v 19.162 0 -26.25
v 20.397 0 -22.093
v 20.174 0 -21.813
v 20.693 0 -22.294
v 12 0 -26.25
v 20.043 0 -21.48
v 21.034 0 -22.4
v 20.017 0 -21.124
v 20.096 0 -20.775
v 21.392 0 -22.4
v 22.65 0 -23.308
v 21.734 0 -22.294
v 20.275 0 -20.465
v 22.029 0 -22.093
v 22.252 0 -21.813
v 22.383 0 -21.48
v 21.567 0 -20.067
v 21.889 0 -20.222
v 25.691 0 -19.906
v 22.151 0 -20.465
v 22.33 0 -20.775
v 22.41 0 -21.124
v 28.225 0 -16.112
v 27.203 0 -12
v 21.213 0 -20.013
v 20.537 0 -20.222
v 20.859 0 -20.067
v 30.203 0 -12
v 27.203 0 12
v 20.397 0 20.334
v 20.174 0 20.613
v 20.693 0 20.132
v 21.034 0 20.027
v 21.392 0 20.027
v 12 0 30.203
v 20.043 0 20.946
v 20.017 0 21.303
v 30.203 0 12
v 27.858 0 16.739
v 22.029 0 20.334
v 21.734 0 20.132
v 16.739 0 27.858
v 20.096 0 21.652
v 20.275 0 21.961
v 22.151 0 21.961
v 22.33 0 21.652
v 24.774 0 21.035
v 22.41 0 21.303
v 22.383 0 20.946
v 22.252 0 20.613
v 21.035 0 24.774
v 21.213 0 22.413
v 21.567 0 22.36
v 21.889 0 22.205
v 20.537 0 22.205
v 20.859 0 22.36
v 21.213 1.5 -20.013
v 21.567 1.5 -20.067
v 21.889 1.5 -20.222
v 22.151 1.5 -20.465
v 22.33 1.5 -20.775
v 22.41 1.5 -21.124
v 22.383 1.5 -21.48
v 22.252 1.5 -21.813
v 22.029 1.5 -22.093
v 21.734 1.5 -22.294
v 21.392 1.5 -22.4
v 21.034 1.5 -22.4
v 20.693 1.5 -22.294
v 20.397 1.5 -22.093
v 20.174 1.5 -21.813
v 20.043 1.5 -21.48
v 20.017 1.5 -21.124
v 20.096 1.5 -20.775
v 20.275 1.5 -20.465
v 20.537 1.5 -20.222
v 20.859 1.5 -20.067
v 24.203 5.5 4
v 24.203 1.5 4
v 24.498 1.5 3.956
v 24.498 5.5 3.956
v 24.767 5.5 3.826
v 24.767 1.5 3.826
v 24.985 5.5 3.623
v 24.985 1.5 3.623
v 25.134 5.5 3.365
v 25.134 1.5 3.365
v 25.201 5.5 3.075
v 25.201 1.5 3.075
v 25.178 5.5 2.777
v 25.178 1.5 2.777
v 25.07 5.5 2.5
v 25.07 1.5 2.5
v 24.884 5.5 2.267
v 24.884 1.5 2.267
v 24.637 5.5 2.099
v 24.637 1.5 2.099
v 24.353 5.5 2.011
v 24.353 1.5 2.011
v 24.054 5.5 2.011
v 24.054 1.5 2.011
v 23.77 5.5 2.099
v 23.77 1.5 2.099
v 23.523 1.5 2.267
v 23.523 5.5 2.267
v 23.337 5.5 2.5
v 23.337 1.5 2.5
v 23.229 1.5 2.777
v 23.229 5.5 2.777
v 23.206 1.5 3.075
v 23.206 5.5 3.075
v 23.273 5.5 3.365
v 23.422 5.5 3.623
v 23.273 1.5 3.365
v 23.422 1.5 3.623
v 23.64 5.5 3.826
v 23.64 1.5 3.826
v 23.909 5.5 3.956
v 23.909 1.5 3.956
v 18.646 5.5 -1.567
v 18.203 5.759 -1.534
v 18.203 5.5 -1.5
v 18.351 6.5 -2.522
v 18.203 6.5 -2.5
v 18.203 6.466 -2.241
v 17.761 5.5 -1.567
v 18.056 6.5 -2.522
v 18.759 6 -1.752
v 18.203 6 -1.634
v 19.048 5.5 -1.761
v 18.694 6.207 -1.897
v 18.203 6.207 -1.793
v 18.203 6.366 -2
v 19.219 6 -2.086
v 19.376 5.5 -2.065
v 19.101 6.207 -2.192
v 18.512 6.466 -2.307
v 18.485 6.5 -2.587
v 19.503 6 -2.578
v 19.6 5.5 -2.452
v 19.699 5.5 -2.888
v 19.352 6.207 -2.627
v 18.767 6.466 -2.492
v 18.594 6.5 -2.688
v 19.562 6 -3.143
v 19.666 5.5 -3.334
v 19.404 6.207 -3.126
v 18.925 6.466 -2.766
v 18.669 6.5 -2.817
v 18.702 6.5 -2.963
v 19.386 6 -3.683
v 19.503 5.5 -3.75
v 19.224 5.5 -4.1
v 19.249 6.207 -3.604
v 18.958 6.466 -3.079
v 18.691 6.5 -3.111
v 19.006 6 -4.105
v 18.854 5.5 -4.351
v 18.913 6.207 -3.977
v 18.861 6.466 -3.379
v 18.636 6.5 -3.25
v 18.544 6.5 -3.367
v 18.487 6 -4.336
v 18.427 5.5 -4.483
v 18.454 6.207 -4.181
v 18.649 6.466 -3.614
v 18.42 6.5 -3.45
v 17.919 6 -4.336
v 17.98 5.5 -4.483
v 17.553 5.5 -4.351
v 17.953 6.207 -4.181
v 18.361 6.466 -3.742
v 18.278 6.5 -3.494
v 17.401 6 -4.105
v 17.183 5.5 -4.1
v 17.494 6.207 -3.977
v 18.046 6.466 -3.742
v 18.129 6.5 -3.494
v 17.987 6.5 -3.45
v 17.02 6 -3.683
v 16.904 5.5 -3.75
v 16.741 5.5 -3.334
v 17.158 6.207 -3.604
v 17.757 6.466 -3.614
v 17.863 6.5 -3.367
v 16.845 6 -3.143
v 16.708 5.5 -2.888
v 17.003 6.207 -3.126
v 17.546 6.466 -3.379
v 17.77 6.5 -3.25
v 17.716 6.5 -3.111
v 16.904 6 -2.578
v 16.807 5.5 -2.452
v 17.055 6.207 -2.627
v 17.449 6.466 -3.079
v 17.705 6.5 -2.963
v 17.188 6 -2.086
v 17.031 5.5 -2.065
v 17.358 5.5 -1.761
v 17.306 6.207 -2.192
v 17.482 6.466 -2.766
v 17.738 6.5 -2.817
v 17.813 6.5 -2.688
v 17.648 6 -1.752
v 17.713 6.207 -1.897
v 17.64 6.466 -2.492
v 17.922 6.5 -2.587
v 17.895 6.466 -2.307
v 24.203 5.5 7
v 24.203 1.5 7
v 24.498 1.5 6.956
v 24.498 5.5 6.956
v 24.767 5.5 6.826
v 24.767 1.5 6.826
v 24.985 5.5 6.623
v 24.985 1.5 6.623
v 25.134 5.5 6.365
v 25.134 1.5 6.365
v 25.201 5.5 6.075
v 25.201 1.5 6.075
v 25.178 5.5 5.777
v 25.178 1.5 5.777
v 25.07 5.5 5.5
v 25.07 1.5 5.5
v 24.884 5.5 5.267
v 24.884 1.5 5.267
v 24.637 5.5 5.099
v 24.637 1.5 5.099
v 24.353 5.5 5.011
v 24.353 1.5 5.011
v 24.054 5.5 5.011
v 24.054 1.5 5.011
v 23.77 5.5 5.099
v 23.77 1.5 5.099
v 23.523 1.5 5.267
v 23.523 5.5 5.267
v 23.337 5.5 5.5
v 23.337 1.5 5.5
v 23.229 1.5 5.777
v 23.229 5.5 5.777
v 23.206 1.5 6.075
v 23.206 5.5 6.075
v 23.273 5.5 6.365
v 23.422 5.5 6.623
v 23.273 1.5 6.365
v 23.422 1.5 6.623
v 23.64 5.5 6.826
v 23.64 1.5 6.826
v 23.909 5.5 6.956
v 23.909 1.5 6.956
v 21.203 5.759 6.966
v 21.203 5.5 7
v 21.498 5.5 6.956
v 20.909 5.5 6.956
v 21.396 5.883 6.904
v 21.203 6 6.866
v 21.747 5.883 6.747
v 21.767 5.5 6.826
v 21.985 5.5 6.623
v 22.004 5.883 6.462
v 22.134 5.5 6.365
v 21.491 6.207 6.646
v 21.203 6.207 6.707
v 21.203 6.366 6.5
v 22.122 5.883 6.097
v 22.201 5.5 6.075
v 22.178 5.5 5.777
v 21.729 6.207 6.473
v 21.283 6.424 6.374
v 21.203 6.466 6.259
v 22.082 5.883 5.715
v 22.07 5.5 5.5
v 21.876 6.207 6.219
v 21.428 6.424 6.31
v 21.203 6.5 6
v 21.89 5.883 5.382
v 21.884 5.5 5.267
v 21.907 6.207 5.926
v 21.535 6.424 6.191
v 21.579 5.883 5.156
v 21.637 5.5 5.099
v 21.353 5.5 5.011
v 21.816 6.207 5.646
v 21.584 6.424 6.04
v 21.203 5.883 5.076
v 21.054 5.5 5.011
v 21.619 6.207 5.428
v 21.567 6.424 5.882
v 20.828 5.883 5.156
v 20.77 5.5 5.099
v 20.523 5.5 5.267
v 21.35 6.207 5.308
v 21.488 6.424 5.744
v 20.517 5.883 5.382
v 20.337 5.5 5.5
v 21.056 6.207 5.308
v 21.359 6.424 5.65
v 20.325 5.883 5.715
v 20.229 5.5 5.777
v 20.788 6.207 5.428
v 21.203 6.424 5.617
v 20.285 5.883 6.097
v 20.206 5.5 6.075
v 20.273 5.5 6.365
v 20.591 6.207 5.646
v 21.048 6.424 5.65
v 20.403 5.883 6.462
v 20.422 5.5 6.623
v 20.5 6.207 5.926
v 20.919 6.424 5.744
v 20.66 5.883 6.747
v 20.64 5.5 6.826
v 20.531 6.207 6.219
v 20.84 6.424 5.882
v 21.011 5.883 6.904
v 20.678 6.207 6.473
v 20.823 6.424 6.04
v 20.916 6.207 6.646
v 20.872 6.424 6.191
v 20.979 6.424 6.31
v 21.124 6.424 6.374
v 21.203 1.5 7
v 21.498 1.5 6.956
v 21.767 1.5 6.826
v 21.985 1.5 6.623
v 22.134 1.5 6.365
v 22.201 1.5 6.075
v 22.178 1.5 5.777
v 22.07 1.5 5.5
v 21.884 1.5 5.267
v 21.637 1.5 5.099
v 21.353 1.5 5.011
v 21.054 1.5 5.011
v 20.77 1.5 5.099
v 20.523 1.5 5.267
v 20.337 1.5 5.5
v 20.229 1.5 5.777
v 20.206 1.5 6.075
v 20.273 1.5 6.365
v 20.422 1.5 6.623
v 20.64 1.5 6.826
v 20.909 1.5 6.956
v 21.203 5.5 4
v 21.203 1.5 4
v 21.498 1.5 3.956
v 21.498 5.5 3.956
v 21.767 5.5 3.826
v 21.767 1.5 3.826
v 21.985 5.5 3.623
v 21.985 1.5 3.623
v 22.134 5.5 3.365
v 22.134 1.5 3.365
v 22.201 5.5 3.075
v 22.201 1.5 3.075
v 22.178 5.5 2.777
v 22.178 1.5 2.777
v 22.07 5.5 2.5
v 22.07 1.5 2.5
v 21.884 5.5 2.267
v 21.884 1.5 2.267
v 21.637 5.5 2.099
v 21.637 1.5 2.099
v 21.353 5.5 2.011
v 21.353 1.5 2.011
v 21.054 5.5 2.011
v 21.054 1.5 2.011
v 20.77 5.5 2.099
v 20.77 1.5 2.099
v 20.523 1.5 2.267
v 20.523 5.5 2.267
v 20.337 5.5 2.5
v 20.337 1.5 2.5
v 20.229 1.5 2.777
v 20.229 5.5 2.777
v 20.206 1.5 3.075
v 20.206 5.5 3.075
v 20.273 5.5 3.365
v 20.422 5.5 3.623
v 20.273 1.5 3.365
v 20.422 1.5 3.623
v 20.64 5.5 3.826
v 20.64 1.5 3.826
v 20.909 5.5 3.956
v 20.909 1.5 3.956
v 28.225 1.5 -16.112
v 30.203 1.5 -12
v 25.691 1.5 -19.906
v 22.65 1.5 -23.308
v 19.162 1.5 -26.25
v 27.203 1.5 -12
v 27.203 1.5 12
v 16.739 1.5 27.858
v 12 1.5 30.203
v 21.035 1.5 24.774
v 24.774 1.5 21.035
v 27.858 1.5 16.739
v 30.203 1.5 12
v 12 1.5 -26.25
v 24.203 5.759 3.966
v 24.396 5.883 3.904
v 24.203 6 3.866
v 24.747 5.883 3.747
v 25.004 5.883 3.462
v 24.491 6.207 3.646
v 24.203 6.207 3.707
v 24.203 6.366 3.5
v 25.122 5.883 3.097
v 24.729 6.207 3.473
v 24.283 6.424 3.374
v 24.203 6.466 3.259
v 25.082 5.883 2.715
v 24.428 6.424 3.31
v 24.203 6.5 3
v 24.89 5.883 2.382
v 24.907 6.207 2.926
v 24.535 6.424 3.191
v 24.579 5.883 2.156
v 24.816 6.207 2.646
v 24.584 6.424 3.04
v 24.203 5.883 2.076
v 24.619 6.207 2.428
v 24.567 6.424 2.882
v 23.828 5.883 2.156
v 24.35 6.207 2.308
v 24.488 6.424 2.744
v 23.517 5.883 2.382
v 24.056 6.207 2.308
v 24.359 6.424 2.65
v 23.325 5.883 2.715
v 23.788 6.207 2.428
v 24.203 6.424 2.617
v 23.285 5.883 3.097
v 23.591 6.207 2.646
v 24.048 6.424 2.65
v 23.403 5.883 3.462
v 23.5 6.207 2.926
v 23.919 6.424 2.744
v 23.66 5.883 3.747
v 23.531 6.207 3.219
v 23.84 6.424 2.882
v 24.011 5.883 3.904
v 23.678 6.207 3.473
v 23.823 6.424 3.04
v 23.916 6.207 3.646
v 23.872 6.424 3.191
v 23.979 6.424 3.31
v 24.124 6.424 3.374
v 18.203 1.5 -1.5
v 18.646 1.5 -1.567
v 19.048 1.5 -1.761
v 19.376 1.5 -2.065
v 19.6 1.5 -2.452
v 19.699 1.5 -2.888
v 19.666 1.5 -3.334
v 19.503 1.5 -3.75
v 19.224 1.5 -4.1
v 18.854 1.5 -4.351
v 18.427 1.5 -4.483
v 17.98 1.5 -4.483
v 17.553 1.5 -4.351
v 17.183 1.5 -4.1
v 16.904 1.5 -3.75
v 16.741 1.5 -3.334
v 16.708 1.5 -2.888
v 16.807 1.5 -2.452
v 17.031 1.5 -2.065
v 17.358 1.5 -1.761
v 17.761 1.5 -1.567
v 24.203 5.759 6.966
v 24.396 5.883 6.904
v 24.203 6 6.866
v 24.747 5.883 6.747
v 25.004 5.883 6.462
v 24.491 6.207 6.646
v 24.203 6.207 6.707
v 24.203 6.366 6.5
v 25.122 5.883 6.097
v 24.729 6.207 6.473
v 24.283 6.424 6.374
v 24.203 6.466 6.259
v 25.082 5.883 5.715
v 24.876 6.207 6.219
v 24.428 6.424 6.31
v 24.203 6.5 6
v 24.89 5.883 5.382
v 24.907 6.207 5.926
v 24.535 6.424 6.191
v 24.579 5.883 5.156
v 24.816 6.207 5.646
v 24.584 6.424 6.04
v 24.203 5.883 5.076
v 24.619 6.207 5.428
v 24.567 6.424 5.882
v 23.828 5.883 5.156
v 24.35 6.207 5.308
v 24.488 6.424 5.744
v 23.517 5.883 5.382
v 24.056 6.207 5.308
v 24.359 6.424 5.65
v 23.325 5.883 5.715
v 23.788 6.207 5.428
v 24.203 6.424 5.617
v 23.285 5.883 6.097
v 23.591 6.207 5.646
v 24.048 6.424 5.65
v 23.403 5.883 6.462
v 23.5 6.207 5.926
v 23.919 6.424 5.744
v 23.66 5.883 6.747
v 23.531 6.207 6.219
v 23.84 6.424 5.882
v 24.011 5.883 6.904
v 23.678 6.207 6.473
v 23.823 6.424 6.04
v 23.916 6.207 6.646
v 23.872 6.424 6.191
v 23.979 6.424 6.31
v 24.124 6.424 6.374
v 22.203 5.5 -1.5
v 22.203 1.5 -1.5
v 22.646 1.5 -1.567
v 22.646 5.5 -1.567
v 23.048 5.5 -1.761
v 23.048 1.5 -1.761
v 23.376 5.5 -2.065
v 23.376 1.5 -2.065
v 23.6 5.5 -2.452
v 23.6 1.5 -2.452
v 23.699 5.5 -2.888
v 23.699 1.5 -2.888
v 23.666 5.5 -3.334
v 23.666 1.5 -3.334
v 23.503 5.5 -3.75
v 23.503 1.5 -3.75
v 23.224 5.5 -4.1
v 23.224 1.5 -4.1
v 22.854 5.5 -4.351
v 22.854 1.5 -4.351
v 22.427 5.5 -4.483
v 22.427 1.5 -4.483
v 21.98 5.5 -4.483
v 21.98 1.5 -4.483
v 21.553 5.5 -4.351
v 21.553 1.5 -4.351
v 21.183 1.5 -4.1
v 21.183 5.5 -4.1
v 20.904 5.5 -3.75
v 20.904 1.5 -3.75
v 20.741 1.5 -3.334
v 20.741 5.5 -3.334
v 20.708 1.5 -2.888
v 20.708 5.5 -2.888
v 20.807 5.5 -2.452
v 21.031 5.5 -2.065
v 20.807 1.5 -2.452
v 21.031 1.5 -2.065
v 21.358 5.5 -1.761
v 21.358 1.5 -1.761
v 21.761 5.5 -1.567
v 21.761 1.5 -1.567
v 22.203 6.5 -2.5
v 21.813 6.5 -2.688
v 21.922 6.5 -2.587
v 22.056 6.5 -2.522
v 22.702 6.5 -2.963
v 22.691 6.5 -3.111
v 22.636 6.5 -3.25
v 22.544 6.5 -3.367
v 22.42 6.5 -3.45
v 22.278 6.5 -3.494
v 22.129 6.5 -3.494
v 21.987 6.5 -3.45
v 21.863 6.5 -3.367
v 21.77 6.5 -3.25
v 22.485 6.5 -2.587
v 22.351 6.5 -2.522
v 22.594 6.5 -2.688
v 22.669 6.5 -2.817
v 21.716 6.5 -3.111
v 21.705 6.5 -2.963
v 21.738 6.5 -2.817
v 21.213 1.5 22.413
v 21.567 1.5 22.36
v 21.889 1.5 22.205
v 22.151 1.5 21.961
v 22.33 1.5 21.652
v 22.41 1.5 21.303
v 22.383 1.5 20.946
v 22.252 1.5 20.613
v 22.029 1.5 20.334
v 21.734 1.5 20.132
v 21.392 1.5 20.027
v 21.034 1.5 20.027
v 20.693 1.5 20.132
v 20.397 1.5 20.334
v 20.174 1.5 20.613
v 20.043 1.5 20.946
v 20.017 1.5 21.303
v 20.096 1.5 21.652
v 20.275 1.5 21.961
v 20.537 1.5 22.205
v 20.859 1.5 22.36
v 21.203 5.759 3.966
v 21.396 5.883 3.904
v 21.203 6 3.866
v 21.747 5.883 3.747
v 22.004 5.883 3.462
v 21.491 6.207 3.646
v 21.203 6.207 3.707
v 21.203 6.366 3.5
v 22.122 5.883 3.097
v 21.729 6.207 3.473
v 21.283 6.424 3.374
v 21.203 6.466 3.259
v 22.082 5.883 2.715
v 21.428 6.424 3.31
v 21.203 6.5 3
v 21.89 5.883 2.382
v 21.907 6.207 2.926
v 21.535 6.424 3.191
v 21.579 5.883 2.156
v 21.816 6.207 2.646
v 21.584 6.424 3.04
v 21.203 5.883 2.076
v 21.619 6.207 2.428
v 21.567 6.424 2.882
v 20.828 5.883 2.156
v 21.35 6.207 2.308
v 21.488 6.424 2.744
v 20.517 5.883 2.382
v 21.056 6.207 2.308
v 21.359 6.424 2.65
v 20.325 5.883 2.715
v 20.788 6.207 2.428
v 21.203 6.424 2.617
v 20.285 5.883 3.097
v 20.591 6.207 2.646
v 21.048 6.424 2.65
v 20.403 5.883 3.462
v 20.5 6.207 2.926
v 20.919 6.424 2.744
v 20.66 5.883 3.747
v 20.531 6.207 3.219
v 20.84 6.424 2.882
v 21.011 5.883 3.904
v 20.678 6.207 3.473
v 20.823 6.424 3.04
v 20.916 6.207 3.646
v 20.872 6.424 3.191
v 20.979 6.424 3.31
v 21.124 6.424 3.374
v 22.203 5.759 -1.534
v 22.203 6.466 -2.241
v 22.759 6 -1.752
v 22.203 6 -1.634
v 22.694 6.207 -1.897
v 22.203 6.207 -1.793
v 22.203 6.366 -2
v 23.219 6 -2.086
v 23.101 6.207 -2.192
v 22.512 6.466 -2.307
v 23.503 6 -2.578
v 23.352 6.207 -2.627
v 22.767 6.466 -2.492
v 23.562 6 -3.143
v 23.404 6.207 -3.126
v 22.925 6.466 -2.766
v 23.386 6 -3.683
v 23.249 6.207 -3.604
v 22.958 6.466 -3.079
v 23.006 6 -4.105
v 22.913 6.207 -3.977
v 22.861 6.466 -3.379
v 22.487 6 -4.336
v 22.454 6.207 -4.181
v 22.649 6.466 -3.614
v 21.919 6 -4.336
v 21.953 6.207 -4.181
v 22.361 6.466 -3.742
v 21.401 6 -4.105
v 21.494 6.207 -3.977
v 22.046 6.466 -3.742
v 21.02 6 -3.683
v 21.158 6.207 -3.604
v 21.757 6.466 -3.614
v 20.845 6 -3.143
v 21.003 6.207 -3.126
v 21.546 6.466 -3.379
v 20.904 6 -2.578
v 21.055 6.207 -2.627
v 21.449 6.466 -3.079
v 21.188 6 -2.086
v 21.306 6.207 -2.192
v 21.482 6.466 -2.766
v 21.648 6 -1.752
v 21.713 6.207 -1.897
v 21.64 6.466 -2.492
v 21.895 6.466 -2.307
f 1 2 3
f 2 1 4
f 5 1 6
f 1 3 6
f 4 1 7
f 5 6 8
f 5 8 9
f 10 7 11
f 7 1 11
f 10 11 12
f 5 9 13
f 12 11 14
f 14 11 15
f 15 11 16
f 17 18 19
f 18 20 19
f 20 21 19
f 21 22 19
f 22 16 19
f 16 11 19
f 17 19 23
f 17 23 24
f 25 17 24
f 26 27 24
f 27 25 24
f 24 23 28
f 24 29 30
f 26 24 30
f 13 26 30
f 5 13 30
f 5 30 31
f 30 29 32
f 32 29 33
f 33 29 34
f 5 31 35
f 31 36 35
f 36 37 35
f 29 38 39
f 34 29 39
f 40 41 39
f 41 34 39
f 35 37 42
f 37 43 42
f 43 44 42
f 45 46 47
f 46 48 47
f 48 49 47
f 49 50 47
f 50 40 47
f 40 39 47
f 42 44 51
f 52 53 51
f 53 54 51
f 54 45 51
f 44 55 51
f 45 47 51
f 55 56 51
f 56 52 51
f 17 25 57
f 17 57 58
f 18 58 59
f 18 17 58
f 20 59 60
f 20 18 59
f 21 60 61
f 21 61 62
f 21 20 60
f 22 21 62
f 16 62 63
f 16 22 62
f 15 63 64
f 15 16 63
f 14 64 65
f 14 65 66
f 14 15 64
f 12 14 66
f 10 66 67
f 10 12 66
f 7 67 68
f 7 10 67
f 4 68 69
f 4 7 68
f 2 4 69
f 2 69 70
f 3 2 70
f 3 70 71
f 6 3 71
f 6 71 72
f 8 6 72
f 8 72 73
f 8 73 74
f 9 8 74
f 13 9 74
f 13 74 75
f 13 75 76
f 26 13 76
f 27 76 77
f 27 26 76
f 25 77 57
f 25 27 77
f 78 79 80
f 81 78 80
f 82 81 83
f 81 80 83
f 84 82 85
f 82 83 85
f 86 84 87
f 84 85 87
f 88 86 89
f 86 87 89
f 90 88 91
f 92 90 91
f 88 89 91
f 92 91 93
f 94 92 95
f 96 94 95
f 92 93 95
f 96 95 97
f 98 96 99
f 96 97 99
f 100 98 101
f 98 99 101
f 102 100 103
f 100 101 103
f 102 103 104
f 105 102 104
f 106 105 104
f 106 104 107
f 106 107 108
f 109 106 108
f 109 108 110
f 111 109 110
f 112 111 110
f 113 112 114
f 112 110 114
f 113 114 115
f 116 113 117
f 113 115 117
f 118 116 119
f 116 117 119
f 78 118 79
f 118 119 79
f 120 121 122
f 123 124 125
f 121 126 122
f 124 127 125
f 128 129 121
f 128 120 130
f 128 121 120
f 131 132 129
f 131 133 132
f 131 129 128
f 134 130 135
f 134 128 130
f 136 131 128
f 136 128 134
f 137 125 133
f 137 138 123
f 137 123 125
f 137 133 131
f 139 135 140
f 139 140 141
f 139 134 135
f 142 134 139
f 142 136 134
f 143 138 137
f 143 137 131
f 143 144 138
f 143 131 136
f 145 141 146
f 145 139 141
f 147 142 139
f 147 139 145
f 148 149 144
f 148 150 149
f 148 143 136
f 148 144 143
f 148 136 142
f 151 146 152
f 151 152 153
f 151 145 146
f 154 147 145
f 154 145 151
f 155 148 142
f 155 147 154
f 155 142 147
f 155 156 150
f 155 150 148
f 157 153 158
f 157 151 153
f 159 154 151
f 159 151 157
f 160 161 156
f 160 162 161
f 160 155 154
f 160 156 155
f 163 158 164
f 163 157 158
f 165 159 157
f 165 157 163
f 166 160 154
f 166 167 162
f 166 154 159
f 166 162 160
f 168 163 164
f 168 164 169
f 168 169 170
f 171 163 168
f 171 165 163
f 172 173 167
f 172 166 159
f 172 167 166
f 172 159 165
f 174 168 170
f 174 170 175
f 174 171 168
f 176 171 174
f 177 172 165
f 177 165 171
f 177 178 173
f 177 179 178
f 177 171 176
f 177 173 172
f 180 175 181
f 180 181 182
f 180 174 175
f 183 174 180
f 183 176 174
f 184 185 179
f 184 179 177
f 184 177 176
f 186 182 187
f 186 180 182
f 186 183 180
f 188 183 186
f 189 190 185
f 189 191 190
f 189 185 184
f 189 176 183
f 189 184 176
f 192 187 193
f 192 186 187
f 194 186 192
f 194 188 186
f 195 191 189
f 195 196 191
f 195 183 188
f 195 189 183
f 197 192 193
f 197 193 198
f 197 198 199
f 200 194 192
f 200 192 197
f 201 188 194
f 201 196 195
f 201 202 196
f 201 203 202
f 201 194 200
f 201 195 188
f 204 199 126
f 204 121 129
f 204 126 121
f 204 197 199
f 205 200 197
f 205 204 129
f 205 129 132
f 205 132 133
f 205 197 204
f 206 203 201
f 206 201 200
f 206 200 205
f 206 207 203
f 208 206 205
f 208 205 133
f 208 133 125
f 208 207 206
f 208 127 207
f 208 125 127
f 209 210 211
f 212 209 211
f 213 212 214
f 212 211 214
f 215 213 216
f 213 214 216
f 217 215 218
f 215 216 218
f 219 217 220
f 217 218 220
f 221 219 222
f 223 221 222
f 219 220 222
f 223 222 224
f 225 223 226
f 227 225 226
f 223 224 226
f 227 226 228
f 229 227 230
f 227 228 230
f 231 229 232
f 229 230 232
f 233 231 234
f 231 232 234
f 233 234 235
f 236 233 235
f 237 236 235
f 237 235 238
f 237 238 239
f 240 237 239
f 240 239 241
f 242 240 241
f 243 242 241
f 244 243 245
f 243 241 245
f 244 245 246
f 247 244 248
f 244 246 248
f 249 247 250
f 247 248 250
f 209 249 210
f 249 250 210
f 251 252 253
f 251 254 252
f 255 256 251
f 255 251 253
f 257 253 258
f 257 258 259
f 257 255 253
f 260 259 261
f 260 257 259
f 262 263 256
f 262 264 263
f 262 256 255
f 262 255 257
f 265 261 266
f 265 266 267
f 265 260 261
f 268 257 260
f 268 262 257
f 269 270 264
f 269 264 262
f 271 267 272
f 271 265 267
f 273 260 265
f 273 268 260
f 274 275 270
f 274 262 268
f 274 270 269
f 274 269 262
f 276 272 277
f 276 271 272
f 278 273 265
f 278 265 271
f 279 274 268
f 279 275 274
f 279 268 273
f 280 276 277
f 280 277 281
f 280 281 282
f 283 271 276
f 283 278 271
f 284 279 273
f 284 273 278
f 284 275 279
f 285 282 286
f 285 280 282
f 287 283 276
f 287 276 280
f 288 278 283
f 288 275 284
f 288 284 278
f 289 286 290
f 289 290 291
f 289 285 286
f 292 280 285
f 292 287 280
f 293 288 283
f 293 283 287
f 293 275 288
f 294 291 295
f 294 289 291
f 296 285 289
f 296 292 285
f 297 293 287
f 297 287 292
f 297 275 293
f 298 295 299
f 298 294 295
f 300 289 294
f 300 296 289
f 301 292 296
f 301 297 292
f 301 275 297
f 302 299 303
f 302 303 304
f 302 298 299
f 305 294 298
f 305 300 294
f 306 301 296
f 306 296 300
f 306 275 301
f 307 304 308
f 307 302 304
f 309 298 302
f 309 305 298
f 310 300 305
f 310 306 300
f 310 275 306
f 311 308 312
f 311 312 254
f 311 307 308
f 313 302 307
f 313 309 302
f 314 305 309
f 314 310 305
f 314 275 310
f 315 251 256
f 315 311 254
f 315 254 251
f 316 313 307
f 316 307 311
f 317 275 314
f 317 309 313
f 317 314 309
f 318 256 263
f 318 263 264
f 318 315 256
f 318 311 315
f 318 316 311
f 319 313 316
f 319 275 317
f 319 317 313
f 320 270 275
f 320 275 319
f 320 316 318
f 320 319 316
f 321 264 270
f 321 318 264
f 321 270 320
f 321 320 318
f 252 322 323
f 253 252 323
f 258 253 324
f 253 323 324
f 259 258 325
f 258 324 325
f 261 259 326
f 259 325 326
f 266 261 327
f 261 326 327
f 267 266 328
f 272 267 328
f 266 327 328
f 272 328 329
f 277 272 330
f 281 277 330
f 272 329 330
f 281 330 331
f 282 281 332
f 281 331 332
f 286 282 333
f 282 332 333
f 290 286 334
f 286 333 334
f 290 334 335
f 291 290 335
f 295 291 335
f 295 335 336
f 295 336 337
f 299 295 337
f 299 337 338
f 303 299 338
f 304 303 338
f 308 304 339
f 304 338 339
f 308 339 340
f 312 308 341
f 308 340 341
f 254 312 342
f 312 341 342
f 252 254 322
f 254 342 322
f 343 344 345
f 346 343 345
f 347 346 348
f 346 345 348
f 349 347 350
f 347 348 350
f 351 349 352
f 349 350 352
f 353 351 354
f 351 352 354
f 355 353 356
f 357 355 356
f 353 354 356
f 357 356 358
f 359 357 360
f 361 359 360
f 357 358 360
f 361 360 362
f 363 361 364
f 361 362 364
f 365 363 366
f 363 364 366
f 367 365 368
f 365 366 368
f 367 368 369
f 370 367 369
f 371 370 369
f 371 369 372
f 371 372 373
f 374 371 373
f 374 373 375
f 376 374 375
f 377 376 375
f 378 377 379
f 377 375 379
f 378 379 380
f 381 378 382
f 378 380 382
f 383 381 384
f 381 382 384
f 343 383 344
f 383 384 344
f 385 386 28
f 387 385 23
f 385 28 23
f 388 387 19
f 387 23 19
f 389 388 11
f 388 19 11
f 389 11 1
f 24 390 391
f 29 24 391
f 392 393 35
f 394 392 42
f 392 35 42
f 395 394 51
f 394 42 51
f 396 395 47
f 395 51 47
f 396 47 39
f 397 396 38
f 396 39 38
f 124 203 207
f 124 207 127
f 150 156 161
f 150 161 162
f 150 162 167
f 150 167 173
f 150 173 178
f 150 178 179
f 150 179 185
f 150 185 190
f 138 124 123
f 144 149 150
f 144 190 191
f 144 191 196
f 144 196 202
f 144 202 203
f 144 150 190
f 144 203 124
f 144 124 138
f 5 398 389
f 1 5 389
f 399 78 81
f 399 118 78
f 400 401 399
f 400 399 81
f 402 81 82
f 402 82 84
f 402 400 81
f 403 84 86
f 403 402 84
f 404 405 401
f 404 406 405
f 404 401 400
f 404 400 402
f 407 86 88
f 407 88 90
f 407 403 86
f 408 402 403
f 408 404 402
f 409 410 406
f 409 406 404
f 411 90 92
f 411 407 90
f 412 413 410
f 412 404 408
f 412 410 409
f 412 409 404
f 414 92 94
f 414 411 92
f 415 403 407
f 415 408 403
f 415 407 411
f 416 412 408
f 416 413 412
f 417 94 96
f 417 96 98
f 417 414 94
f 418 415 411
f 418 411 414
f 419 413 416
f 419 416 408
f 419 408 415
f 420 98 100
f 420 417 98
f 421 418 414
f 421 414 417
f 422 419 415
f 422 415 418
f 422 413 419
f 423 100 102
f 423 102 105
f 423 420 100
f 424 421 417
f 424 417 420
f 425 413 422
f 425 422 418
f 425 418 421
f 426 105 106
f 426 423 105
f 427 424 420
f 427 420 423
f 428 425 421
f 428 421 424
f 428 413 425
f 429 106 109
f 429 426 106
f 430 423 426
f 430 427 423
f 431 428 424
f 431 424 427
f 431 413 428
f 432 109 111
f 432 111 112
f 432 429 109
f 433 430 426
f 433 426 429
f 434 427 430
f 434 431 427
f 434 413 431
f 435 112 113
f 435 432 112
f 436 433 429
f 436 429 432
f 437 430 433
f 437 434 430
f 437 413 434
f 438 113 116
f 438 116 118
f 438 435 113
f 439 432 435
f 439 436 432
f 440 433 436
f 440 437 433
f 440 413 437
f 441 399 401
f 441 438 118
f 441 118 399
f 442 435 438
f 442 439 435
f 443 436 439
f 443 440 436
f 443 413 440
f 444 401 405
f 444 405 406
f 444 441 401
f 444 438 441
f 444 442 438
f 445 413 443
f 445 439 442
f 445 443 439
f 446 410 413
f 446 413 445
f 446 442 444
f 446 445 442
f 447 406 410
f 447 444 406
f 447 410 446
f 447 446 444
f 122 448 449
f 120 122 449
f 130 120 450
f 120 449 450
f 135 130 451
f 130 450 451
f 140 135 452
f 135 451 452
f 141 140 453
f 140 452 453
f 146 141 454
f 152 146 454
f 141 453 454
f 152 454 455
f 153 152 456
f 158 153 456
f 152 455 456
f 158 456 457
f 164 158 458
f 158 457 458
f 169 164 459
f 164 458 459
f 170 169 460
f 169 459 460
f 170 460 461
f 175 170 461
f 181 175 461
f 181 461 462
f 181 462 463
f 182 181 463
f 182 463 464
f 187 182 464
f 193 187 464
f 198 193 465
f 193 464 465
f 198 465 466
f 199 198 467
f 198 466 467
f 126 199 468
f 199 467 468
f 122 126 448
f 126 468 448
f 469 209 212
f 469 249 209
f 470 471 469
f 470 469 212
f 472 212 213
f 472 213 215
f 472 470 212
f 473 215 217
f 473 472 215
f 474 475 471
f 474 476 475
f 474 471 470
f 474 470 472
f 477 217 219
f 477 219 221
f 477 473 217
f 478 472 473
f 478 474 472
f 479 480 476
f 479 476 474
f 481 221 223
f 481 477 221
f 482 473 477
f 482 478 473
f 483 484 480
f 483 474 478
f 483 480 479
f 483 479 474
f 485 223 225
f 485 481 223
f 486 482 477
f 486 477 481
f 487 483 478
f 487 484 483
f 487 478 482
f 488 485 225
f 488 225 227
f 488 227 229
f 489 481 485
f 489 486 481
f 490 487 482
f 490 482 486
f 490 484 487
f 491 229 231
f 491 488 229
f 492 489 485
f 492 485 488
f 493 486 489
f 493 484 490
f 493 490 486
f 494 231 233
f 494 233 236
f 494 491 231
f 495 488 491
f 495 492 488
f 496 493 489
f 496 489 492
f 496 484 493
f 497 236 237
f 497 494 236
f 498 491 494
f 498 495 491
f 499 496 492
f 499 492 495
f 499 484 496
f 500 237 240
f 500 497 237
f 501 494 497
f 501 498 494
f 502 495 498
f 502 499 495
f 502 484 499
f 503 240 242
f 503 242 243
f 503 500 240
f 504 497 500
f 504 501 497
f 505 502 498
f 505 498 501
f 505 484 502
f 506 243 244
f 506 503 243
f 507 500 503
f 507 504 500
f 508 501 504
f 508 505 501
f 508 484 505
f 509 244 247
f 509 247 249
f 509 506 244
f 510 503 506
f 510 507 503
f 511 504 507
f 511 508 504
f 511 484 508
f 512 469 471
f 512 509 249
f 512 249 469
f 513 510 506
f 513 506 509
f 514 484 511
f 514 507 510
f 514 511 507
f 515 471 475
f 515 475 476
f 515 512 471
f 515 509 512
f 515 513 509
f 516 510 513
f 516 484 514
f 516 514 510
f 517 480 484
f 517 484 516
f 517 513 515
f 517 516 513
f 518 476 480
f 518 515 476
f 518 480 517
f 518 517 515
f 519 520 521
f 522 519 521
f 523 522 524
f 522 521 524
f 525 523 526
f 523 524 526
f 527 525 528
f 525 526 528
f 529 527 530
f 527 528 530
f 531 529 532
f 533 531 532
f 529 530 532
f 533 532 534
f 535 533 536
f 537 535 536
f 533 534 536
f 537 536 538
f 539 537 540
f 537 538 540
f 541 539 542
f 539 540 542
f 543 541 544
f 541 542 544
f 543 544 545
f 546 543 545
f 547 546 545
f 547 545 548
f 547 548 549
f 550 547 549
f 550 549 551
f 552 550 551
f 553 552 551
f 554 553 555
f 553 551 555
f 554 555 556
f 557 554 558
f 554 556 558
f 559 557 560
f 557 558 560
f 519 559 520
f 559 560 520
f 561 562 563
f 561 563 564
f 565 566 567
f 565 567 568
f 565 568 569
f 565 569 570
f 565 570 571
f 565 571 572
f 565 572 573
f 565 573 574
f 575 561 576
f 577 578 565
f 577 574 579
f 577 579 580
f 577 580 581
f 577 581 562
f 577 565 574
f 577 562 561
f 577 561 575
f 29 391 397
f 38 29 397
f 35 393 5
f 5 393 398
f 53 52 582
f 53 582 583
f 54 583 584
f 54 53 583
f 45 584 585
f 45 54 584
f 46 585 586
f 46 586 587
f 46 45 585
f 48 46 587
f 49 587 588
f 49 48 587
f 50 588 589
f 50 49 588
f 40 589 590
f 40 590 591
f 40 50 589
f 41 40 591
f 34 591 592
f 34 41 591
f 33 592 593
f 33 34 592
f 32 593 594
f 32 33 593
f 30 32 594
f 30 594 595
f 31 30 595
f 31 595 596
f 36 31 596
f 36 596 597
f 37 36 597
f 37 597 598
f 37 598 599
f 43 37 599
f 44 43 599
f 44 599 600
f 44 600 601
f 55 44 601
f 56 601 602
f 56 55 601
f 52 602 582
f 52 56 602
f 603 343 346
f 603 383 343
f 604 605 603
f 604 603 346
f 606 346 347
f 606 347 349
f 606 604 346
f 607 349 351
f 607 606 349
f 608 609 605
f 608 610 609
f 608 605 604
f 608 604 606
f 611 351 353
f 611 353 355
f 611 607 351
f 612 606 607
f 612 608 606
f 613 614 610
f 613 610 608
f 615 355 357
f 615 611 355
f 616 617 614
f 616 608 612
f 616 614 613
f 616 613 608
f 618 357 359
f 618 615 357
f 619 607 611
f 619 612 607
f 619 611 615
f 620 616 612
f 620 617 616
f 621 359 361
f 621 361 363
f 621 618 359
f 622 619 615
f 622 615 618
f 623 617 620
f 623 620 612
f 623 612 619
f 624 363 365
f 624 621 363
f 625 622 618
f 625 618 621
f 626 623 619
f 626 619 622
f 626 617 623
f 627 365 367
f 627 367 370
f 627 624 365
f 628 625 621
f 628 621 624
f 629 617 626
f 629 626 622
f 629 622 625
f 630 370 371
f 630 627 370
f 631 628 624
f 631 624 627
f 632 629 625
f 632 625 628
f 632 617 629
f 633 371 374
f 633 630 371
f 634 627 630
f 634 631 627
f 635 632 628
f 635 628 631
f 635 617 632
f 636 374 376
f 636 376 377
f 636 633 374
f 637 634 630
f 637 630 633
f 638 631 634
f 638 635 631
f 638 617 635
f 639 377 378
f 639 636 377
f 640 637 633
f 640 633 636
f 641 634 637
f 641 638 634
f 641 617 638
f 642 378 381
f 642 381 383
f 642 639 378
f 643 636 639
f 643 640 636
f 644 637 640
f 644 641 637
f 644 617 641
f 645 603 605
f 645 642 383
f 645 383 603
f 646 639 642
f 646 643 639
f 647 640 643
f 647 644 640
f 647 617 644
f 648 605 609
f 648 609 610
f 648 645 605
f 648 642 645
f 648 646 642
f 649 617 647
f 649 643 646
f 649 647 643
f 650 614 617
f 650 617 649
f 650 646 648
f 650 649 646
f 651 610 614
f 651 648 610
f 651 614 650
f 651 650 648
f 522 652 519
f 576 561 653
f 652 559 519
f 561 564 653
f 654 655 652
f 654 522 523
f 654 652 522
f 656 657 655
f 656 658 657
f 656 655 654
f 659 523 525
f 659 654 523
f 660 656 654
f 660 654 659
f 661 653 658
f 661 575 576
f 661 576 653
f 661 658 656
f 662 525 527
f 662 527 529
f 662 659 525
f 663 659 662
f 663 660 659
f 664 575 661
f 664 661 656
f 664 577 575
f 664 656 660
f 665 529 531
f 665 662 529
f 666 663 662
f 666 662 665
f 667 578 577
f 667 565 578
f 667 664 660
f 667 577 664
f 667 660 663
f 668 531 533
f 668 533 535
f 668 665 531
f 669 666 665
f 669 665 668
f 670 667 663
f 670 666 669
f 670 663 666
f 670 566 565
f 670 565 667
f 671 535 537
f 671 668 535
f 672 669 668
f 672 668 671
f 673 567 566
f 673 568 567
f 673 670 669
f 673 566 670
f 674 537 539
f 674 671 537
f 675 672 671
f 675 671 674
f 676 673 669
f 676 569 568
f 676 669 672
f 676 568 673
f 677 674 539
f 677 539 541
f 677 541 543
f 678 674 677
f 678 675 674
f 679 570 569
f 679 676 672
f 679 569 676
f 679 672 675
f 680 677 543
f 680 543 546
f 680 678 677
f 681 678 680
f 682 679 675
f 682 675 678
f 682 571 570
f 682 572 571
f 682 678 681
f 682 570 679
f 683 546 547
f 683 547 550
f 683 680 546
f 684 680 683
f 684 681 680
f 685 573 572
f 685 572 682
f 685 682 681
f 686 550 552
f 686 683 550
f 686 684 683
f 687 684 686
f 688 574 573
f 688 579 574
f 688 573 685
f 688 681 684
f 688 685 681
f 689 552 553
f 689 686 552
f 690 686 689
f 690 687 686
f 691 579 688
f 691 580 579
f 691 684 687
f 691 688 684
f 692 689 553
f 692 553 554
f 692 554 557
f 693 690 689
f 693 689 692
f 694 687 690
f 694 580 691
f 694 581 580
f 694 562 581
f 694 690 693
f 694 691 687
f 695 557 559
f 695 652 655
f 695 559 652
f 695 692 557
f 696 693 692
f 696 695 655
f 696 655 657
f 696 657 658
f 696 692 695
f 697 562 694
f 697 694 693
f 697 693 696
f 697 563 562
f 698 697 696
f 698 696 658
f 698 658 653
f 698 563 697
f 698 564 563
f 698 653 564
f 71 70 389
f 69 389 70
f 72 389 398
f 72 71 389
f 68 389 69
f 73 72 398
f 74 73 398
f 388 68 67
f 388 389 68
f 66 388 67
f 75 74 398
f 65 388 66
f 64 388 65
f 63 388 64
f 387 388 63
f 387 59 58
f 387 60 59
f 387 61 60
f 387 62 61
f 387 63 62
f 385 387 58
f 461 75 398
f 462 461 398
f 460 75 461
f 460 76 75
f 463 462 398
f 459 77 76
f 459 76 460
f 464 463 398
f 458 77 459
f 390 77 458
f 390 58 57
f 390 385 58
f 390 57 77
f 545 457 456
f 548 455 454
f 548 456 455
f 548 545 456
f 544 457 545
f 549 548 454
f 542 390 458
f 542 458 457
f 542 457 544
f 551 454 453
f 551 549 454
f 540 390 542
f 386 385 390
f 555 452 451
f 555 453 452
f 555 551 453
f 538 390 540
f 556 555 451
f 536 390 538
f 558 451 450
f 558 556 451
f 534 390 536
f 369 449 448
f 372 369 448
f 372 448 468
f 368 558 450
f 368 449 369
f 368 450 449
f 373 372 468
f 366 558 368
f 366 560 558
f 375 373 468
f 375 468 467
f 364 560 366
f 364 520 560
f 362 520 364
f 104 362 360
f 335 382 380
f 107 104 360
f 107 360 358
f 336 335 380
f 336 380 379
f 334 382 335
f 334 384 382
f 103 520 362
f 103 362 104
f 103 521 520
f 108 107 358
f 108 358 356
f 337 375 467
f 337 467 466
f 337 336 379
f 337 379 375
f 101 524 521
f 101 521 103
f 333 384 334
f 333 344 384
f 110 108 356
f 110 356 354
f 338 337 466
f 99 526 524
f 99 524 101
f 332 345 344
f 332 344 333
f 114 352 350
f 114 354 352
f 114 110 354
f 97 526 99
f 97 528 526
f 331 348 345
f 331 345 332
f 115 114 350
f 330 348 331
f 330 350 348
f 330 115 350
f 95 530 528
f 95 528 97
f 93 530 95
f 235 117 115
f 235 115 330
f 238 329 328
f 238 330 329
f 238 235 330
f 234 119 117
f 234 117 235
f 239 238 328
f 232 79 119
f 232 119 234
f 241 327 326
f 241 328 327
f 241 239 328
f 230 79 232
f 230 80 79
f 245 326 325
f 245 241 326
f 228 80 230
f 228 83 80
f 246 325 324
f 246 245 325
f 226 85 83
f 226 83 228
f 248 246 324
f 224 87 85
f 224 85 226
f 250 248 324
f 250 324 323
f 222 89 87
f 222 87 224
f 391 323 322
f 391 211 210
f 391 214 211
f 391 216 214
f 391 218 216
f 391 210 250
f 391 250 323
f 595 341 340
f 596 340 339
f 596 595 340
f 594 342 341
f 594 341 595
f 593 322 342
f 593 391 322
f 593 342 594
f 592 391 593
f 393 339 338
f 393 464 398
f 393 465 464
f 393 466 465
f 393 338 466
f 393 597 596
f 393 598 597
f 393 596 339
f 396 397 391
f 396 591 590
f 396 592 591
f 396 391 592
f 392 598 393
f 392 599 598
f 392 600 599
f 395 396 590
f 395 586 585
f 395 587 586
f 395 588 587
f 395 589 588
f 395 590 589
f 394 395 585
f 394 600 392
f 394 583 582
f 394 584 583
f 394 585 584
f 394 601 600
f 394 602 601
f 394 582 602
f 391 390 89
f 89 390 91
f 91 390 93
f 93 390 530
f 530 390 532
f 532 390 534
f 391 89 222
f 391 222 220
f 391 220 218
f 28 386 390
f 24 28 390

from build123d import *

# Parameters (mm, degrees)
SKETCH_1_R          = 32.5
SKETCH_1_R_2        = 1.2
EXTRUDE_1_DEPTH     = 1.5
CUT_EXTRUDE_1_DEPTH = 46.986411036
CUT_EXTRUDE_2_DEPTH = 43.74049602
SKETCH_4_R          = 1.5
SKETCH_4_R_2        = 1
EXTRUDE_2_DEPTH     = 5
FILLET_1_R          = 1
CUT_EXTRUDE_3_DEPTH = 5


with BuildPart() as part:
    # 草图1 → 凸台-拉伸1 (new body)
    with BuildSketch(Plane(origin=(0, 0, 0), x_dir=(1, 0, 0), z_dir=(0, 1, 0))):
        with Locations(Location((0, 0, 0), (0, 0, 270))):
            Circle(SKETCH_1_R)
        with Locations(Location((21.213203436, 21.213203436, 0), (0, 0, 270))):
            Circle(SKETCH_1_R_2, mode=Mode.SUBTRACT)
        with Locations(Location((21.213203436, -21.213203436, 0), (0, 0, 270))):
            Circle(SKETCH_1_R_2, mode=Mode.SUBTRACT)
        with Locations(Location((-21.213203436, -21.213203436, 0), (0, 0, 270))):
            Circle(SKETCH_1_R_2, mode=Mode.SUBTRACT)
        with Locations(Location((-21.213203436, 21.213203436, 0), (0, 0, 270))):
            Circle(SKETCH_1_R_2, mode=Mode.SUBTRACT)
    extrude(amount=EXTRUDE_1_DEPTH)

    # 草图2 → 切除-拉伸1 (cut, through all)
    with BuildSketch(Plane(origin=(0, 1.5, 0), x_dir=(1, 0, 0), z_dir=(0, 1, 0))):
        with BuildLine():
            Line((30.203476621, 12), (27.203476621, 12))
            Line((27.203476621, 12), (27.203476621, -12))
            Line((27.203476621, -12), (30.203476621, -12))
            ThreePointArc((30.203476621, -12), (32.5, 0), (30.203476621, 12))
        make_face()
        with BuildLine():
            Line((12, -27.203476621), (-12, -27.203476621))
            Line((-12, -27.203476621), (-12, -30.203476621))
            ThreePointArc((-12, -30.203476621), (0, -32.5), (12, -30.203476621))
            Line((12, -30.203476621), (12, -27.203476621))
        make_face()
        with BuildLine():
            Line((-27.203476621, -12), (-27.203476621, 12))
            Line((-27.203476621, 12), (-30.203476621, 12))
            ThreePointArc((-30.203476621, 12), (-32.5, 0), (-30.203476621, -12))
            Line((-30.203476621, -12), (-27.203476621, -12))
        make_face()
        with BuildLine():
            Line((-12, 27.203476621), (12, 27.203476621))
            Line((12, 27.203476621), (12, 30.203476621))
            ThreePointArc((12, 30.203476621), (0, 32.5), (-12, 30.203476621))
            Line((-12, 30.203476621), (-12, 27.203476621))
        make_face()
    extrude(amount=-CUT_EXTRUDE_1_DEPTH, mode=Mode.SUBTRACT)

    # 草图3 → 切除-拉伸2 (cut, through all)
    with BuildSketch(Plane(origin=(0, 1.5, 0), x_dir=(1, 0, 0), z_dir=(0, 1, 0))):
        Polygon((17, 26.25), (-17, 26.25), (-27.149655647, 26.25), (-14.240374978, 46.745445694), (28.149411973, 26.25), align=None)
    extrude(amount=-CUT_EXTRUDE_2_DEPTH, mode=Mode.SUBTRACT)

    # 草图4 → 凸台-拉伸2 (add)
    with BuildSketch(Plane(origin=(0, 1.5, 0), x_dir=(1, 0, 0), z_dir=(0, 1, 0))):
        with Locations(Location((22.203476621, 3, 0), (0, 0, 270))):
            Circle(SKETCH_4_R)
        with Locations(Location((18.203476621, 3, 0), (0, 0, 270))):
            Circle(SKETCH_4_R)
        with Locations(Location((24.203476621, -6, 0), (0, 0, 270))):
            Circle(SKETCH_4_R_2)
        with Locations(Location((24.203476621, -3, 0), (0, 0, 270))):
            Circle(SKETCH_4_R_2)
        with Locations(Location((21.203476621, -6, 0), (0, 0, 270))):
            Circle(SKETCH_4_R_2)
        with Locations(Location((21.203476621, -3, 0), (0, 0, 270))):
            Circle(SKETCH_4_R_2)
    extrude(amount=EXTRUDE_2_DEPTH)

    # 圆角1
    fillet_1_edges = [part.edges().sort_by_distance(p)[0] for p in [
        (22.203476621, 6.5, -4.5),
        (18.203476621, 6.5, -4.5),
        (24.203476621, 6.5, 5),
        (24.203476621, 6.5, 2),
        (21.203476621, 6.5, 5),
        (21.203476621, 6.5, 2),
    ]]
    fillet(fillet_1_edges, radius=FILLET_1_R)

    # 草图5 → 切除-拉伸3 (cut)
    with BuildSketch(Plane(origin=(0, 1.5, 0), x_dir=(1, 0, 0), z_dir=(0, 1, 0))):
        Polygon((12, -30.203476621), (12, 30.744142548), (-38.712969595, 30.744142548), (-38.712969595, -27.203476621), align=None)
    extrude(amount=-CUT_EXTRUDE_3_DEPTH, mode=Mode.SUBTRACT)


with BuildPart() as body_2:
    # of the pieces the cut leaves, the one that is kept (cut_extrude_3_keep)
    add(part.part.solids().sort_by_distance((21.203476621, 5.5, 7))[0])


solid = body_2.part
